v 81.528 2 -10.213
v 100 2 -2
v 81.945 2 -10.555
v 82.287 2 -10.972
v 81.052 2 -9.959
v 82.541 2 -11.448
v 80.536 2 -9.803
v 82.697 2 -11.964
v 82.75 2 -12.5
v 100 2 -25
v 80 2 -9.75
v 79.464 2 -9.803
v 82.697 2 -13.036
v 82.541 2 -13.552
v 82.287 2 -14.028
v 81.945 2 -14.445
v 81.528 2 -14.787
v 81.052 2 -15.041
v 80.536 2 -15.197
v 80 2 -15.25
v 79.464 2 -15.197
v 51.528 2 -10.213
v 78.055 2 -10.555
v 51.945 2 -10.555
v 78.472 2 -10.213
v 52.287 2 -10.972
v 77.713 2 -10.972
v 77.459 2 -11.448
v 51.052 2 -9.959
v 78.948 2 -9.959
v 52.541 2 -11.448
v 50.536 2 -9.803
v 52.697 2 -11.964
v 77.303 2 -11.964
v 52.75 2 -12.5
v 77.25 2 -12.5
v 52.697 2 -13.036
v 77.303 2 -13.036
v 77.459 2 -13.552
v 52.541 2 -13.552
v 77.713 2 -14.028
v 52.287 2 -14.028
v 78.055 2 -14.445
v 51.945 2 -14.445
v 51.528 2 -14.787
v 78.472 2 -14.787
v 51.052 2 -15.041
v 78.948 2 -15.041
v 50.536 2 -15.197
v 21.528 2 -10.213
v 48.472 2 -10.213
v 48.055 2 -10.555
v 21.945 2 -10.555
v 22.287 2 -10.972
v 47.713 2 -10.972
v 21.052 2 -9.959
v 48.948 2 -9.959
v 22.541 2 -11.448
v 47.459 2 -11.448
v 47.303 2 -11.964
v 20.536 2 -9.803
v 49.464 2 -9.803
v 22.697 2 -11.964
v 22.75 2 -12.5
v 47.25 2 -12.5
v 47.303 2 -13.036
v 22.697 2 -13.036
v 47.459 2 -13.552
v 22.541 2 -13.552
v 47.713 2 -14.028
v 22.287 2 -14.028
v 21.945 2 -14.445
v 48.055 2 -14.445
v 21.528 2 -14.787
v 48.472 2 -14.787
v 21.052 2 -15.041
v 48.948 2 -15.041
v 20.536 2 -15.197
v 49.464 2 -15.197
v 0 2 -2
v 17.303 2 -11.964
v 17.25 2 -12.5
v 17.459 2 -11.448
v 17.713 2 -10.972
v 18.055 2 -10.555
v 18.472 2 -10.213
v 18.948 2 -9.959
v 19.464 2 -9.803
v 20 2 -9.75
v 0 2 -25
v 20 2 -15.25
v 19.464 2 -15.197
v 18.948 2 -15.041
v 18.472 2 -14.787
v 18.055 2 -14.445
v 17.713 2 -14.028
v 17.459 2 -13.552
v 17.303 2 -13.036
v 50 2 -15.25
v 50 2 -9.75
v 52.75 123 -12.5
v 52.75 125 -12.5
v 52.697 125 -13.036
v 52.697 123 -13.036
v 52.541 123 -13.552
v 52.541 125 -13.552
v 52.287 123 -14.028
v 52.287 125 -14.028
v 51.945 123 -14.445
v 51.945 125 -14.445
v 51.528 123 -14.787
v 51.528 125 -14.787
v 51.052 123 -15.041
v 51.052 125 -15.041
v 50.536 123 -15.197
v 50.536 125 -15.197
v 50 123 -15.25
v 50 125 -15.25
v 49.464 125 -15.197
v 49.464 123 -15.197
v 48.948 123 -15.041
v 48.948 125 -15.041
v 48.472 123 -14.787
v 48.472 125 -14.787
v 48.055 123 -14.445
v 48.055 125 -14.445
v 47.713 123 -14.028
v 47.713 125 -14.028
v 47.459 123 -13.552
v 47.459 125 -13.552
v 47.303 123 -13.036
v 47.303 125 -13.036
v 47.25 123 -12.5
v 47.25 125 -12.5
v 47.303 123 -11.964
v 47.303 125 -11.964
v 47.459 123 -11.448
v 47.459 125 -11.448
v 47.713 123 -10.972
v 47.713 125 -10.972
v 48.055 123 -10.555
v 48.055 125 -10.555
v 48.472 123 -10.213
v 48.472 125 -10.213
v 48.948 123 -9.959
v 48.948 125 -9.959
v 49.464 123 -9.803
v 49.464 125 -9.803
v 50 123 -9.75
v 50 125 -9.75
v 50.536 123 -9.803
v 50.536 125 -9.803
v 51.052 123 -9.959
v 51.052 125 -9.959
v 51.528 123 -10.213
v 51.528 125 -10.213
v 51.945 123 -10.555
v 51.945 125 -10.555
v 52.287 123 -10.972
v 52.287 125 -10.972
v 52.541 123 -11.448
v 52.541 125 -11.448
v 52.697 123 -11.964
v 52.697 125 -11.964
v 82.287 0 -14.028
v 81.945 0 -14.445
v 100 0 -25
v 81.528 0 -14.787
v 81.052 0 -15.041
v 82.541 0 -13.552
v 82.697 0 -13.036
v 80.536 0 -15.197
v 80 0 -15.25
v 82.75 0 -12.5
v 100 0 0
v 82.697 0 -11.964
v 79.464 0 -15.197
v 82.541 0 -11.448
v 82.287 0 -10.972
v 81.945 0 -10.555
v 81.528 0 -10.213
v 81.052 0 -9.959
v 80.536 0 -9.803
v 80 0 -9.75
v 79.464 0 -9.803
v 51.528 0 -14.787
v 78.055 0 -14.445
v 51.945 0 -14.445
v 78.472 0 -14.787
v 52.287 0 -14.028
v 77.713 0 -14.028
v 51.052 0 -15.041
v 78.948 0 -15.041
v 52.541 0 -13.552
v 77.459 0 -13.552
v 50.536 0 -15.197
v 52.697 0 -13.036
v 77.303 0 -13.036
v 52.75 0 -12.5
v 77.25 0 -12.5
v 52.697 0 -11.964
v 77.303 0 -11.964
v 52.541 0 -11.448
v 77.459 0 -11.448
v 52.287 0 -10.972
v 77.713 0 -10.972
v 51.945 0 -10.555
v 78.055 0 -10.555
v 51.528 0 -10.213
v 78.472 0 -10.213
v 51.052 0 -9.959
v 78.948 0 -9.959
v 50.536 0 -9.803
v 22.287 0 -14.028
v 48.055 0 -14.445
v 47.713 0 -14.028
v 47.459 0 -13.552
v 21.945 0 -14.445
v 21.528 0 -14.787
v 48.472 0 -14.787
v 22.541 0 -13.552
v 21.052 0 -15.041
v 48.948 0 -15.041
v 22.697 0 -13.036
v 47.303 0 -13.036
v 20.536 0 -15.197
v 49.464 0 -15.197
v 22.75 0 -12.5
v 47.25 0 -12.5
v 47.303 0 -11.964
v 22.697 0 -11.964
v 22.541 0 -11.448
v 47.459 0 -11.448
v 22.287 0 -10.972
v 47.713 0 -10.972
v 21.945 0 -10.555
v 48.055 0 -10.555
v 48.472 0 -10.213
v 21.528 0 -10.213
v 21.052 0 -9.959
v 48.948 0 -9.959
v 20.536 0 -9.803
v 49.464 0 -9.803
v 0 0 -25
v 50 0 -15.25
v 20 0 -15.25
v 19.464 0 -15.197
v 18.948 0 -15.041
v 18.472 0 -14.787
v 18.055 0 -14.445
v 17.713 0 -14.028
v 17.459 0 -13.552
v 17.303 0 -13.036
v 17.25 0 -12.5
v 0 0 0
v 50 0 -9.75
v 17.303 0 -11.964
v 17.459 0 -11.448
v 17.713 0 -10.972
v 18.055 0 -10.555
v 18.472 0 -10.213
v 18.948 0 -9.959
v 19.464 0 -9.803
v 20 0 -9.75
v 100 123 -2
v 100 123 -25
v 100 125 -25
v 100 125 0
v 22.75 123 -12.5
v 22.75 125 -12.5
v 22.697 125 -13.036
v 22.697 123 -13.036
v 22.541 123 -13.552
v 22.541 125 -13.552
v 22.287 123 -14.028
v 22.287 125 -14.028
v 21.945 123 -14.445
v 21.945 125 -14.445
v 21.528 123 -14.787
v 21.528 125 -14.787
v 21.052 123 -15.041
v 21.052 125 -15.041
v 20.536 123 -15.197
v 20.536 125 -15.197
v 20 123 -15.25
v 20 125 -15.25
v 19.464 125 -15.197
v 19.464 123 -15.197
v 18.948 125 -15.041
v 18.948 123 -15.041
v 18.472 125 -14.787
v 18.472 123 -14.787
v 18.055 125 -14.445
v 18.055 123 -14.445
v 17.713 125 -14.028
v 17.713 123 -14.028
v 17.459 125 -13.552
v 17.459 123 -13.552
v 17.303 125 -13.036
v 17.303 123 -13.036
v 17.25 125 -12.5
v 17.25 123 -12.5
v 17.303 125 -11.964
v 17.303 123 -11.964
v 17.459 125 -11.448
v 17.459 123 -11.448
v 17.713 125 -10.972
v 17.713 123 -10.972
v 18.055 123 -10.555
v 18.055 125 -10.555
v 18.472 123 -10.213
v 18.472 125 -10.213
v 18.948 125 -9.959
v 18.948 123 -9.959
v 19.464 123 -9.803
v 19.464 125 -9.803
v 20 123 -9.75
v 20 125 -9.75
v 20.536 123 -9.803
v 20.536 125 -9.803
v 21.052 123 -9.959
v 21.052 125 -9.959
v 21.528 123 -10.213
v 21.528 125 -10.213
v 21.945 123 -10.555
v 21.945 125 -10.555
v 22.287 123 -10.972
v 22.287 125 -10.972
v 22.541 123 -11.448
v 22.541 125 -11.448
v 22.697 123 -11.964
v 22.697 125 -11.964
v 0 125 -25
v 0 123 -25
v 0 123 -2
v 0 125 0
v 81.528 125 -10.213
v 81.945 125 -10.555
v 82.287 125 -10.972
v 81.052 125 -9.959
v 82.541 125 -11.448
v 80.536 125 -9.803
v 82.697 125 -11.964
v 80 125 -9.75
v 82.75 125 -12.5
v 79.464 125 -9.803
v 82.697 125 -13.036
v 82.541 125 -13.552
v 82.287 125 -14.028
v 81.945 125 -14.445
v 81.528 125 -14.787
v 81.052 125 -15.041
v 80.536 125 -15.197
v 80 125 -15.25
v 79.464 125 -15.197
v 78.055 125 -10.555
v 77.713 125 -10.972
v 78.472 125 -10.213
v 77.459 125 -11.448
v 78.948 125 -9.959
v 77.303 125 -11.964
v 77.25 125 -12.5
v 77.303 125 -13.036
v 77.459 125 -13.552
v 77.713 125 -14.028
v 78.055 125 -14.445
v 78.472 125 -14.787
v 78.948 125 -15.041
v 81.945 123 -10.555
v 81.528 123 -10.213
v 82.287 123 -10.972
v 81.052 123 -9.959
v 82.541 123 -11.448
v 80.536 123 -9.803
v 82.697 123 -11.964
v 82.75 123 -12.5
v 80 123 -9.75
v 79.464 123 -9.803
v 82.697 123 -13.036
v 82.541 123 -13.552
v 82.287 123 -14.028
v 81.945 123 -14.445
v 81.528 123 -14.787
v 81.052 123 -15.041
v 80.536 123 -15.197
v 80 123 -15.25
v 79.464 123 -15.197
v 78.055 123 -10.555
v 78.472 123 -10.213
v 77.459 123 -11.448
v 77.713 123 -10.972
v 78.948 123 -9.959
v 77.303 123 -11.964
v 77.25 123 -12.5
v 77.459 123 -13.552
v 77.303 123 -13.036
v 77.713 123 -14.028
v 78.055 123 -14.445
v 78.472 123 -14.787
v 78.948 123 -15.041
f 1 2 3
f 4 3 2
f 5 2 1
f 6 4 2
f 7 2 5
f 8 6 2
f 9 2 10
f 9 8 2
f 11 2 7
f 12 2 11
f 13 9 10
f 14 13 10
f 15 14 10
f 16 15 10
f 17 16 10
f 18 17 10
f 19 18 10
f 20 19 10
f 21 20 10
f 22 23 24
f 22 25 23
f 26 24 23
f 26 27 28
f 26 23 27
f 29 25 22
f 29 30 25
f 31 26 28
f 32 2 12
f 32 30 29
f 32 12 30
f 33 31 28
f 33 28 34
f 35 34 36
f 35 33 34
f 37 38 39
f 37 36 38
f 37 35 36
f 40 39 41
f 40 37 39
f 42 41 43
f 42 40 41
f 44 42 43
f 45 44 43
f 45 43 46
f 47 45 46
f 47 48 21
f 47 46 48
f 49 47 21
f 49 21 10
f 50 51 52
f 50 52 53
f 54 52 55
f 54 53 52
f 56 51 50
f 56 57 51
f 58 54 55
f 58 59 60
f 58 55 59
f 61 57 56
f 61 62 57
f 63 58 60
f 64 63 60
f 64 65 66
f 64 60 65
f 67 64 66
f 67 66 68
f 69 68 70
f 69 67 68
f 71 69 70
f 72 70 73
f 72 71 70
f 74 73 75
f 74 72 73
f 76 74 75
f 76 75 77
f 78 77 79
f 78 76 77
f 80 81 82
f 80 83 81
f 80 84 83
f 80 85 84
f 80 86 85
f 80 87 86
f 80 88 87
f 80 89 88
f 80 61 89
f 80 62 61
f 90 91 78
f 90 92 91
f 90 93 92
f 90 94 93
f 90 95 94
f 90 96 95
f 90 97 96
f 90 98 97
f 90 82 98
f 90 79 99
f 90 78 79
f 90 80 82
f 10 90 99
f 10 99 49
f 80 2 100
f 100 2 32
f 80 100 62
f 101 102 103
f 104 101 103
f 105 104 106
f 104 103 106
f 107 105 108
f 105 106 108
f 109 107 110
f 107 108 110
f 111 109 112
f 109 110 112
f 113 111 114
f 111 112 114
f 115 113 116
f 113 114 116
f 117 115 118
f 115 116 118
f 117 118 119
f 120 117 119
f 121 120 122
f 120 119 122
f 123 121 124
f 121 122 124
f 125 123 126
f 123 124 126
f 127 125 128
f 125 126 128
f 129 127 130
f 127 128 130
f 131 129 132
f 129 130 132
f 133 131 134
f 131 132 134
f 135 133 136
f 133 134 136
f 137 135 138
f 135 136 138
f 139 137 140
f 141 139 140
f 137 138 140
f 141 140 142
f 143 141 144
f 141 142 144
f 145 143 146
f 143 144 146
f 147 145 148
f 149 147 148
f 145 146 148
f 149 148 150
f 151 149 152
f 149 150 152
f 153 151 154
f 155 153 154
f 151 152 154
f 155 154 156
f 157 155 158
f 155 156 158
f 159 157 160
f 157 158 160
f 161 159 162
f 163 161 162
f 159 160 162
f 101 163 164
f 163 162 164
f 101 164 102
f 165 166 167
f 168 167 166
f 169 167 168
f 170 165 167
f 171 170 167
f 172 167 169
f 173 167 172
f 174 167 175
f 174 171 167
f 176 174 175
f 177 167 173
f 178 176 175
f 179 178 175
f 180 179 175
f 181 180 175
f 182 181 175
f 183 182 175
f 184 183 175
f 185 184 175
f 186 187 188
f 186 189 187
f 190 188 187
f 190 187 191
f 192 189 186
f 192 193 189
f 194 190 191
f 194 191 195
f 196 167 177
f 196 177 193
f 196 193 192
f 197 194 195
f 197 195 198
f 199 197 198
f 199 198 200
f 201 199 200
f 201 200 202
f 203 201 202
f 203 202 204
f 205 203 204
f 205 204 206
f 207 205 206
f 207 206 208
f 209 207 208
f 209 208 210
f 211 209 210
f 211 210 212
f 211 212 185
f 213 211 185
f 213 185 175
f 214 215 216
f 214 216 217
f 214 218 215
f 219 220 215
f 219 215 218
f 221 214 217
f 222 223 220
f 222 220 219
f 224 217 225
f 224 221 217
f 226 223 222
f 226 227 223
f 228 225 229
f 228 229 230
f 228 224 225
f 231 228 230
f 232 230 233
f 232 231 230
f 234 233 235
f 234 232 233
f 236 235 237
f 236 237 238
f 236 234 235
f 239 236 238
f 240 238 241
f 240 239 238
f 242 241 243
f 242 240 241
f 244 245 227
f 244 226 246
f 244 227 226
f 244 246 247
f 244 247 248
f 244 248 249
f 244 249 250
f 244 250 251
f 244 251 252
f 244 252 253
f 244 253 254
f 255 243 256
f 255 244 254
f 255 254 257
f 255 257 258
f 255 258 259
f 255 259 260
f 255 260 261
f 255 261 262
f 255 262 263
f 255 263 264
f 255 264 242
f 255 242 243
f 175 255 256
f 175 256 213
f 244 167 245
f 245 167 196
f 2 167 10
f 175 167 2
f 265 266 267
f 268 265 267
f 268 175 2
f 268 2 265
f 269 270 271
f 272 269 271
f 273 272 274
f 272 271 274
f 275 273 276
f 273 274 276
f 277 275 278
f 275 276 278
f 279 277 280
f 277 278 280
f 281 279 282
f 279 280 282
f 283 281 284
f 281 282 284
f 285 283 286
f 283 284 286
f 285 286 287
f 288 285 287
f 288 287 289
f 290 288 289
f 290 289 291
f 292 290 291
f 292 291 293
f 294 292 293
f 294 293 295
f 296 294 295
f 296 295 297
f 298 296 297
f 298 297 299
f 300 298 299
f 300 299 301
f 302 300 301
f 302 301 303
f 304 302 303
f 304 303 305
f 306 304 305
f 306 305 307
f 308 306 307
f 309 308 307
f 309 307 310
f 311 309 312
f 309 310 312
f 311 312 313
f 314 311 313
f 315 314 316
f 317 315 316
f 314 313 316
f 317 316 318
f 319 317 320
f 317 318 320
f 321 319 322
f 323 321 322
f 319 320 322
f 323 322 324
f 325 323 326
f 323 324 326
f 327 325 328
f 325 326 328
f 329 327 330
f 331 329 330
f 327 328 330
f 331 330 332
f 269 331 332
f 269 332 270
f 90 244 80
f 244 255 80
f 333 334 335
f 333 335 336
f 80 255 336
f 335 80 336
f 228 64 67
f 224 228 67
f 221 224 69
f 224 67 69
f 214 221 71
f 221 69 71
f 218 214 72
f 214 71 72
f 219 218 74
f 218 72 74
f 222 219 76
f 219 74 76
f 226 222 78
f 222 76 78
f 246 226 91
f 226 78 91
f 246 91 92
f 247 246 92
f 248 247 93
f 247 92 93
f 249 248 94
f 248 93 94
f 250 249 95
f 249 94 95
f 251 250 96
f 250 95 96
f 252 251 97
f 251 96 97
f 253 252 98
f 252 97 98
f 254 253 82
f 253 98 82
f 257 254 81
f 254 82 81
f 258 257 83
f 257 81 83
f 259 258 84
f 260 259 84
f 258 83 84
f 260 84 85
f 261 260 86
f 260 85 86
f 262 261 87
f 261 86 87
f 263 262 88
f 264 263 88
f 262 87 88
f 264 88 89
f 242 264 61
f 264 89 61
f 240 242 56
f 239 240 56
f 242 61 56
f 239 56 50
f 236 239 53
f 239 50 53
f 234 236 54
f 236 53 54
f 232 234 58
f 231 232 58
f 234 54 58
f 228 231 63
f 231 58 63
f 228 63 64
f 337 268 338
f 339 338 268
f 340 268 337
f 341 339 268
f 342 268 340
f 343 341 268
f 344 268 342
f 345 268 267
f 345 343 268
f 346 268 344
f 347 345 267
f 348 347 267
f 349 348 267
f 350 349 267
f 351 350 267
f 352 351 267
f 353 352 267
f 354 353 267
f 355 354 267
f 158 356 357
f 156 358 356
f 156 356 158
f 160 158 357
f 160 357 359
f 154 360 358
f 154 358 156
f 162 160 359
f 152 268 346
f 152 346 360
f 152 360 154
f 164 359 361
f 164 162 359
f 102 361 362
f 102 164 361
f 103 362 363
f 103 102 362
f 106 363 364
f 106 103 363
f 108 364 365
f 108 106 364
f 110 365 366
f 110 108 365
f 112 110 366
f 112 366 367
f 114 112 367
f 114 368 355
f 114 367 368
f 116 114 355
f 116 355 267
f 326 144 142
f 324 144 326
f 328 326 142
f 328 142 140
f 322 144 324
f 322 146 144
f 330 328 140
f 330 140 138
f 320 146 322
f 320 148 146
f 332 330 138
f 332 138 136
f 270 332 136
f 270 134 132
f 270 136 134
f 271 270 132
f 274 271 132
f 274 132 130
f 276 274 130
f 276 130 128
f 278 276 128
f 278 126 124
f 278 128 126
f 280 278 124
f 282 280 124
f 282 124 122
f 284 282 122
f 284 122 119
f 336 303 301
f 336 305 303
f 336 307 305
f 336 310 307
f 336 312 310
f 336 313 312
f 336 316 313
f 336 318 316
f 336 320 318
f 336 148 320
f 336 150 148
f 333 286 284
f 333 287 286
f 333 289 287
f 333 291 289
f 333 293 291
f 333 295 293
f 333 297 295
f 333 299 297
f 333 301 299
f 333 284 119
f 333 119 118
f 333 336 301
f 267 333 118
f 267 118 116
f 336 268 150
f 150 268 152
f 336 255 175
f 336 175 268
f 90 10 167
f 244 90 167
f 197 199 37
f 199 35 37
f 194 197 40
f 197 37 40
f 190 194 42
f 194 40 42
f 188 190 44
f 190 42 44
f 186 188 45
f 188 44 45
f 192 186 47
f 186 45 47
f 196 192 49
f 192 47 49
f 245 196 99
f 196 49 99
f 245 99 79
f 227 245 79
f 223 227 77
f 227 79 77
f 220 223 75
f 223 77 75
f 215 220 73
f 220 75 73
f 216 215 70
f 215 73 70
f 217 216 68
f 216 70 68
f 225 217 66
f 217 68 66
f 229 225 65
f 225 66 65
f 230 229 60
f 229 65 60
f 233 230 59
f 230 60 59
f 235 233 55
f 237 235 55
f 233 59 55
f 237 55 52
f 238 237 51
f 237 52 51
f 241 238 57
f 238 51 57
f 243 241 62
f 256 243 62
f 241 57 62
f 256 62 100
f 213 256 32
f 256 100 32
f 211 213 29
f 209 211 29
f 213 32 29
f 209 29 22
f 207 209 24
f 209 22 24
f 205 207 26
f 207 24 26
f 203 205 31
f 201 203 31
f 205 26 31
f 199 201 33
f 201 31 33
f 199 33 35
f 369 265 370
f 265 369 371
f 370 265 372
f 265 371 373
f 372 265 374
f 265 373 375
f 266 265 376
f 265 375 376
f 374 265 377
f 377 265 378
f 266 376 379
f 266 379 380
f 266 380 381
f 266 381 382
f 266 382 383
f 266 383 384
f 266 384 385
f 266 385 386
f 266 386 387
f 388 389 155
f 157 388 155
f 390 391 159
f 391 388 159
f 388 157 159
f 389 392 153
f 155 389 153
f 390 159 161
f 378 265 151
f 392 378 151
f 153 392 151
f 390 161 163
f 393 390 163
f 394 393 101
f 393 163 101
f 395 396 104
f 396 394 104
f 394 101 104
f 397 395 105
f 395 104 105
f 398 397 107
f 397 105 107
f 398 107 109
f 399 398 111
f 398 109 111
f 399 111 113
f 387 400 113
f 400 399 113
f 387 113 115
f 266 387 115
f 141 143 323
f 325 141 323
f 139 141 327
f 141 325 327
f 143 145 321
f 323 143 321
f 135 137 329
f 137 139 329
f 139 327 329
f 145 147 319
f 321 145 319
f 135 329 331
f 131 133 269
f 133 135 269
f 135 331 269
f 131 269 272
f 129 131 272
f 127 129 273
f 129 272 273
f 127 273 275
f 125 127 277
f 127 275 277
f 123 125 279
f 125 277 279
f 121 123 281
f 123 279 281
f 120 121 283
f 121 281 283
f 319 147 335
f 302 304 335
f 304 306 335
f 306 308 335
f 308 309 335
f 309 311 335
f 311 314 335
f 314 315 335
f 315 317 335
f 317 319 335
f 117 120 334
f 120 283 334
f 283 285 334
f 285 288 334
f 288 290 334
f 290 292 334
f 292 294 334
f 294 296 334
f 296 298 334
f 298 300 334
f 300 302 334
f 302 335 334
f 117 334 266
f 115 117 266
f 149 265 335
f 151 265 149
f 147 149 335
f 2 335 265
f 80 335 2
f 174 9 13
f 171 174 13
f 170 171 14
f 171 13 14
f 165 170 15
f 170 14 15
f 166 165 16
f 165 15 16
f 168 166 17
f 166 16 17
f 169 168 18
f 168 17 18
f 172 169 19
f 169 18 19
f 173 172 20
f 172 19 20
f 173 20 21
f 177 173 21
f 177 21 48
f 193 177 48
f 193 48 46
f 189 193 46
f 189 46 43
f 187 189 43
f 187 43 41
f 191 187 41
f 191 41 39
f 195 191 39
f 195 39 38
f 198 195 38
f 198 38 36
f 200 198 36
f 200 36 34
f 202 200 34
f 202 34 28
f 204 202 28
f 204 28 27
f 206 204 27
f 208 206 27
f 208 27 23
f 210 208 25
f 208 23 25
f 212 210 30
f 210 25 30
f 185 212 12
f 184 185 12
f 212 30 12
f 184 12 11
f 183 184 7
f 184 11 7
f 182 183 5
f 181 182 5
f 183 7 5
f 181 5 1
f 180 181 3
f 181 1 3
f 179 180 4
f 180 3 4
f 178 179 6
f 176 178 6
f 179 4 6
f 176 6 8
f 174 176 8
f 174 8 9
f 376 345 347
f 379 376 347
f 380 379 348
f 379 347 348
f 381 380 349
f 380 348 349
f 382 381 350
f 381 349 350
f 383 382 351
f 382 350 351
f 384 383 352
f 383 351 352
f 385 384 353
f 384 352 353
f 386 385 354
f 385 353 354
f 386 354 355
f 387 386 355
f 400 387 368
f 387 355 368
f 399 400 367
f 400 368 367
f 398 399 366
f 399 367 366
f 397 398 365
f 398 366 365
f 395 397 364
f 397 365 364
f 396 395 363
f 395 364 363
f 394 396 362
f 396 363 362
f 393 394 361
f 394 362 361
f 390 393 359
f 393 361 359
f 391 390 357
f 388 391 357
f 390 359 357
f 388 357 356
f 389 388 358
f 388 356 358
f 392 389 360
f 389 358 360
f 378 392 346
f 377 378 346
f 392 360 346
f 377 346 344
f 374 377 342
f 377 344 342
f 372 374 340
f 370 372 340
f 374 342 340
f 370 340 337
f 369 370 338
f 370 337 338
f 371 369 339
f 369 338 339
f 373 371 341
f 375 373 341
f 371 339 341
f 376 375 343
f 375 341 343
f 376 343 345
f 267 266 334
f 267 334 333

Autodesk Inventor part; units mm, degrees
ref_plane "YZ Plane" through (0, 0, 0) normal (1, 0, 0) x (0, 1, 0)
ref_plane "XZ Plane" through (0, 0, 0) normal (0, 1, 0) x (-1, 0, 0)
ref_plane "XY Plane" through (0, 0, 0) normal (0, 0, 1) x (1, 0, 0)
sketch "Sketch1" plane through (0, 0, 0) normal (1, 0, 0) x (0, 1, 0)
  line L0 (0, 0) -> (125, 0)
  line L1 (125, 0) -> (125, -2)
  line L2 (125, -2) -> (0, -2)
  line L3 (0, -2) -> (0, 0)
  line L4 (125, 0) -> (123, 0)
  line L5 (123, 0) -> (123, -25)
  line L6 (123, -25) -> (125, -25)
  line L7 (125, -25) -> (125, 0)
  line L8 (0, 0) -> (2, 0)
  line L9 (2, 0) -> (2, -25)
  line L10 (2, -25) -> (0, -25)
  line L11 (0, -25) -> (0, 0)
  dimension "d0" = 125
  dimension "d1" = 2
  dimension "d2" = 2
  dimension "d3" = 25
  dimension "d4" = 2
  dimension "d5" = 25
extrude "Extrusion1" add sketch "Sketch1" along normal blind 100
sketch "Sketch2" plane through (0, 125, 0) normal (0, 1, 0) x (1, 0, 0)
  circle A0 centre (20, 12.5) radius 2.75
  circle A1 centre (50, 12.5) radius 2.75
  circle A2 centre (80, 12.5) radius 2.75
  line L0 (100, 25) -> (100, 0) projected
  line L1 (0, 25) -> (0, 0) projected
  line L2 (0, 25) -> (100, 25) projected
  dimension "d8" = 5.5
  dimension "d9" = 5.5
  dimension "d10" = 5.5
  dimension "d11" = 20
  dimension "d12" = 20
  dimension "d13" = 50
  dimension "d14" = 12.5
  dimension "d15" = 12.5
  dimension "d16" = 12.5
extrude "Extrusion2" cut sketch "Sketch2" against normal blind 125
properties part number "Vertical Plate Support" material "Aluminum 6061"
